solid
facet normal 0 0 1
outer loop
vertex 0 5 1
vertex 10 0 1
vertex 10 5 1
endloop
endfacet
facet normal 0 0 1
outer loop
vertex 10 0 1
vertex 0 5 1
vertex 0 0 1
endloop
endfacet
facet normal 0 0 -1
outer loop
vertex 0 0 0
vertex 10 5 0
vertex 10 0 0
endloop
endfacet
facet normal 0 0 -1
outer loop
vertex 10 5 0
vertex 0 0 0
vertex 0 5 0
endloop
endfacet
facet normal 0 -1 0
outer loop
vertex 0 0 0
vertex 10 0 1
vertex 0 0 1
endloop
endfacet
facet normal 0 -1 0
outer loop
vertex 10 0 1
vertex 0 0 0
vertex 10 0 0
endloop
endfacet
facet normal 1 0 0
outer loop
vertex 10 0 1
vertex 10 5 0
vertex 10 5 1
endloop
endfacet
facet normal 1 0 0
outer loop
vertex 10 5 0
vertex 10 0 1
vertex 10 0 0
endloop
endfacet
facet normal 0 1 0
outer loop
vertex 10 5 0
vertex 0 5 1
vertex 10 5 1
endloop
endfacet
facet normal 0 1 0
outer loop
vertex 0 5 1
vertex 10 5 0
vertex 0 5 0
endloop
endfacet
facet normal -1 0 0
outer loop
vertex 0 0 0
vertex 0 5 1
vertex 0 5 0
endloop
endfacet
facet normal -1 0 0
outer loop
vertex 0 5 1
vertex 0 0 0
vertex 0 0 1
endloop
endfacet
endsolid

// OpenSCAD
//hh - длина, eh - ширина, z - глубина
 module cuba(hh=10,eh=20,z=3){
 cube([hh,eh,z]);
}
 cuba(hh=10,eh=5,z=1);
